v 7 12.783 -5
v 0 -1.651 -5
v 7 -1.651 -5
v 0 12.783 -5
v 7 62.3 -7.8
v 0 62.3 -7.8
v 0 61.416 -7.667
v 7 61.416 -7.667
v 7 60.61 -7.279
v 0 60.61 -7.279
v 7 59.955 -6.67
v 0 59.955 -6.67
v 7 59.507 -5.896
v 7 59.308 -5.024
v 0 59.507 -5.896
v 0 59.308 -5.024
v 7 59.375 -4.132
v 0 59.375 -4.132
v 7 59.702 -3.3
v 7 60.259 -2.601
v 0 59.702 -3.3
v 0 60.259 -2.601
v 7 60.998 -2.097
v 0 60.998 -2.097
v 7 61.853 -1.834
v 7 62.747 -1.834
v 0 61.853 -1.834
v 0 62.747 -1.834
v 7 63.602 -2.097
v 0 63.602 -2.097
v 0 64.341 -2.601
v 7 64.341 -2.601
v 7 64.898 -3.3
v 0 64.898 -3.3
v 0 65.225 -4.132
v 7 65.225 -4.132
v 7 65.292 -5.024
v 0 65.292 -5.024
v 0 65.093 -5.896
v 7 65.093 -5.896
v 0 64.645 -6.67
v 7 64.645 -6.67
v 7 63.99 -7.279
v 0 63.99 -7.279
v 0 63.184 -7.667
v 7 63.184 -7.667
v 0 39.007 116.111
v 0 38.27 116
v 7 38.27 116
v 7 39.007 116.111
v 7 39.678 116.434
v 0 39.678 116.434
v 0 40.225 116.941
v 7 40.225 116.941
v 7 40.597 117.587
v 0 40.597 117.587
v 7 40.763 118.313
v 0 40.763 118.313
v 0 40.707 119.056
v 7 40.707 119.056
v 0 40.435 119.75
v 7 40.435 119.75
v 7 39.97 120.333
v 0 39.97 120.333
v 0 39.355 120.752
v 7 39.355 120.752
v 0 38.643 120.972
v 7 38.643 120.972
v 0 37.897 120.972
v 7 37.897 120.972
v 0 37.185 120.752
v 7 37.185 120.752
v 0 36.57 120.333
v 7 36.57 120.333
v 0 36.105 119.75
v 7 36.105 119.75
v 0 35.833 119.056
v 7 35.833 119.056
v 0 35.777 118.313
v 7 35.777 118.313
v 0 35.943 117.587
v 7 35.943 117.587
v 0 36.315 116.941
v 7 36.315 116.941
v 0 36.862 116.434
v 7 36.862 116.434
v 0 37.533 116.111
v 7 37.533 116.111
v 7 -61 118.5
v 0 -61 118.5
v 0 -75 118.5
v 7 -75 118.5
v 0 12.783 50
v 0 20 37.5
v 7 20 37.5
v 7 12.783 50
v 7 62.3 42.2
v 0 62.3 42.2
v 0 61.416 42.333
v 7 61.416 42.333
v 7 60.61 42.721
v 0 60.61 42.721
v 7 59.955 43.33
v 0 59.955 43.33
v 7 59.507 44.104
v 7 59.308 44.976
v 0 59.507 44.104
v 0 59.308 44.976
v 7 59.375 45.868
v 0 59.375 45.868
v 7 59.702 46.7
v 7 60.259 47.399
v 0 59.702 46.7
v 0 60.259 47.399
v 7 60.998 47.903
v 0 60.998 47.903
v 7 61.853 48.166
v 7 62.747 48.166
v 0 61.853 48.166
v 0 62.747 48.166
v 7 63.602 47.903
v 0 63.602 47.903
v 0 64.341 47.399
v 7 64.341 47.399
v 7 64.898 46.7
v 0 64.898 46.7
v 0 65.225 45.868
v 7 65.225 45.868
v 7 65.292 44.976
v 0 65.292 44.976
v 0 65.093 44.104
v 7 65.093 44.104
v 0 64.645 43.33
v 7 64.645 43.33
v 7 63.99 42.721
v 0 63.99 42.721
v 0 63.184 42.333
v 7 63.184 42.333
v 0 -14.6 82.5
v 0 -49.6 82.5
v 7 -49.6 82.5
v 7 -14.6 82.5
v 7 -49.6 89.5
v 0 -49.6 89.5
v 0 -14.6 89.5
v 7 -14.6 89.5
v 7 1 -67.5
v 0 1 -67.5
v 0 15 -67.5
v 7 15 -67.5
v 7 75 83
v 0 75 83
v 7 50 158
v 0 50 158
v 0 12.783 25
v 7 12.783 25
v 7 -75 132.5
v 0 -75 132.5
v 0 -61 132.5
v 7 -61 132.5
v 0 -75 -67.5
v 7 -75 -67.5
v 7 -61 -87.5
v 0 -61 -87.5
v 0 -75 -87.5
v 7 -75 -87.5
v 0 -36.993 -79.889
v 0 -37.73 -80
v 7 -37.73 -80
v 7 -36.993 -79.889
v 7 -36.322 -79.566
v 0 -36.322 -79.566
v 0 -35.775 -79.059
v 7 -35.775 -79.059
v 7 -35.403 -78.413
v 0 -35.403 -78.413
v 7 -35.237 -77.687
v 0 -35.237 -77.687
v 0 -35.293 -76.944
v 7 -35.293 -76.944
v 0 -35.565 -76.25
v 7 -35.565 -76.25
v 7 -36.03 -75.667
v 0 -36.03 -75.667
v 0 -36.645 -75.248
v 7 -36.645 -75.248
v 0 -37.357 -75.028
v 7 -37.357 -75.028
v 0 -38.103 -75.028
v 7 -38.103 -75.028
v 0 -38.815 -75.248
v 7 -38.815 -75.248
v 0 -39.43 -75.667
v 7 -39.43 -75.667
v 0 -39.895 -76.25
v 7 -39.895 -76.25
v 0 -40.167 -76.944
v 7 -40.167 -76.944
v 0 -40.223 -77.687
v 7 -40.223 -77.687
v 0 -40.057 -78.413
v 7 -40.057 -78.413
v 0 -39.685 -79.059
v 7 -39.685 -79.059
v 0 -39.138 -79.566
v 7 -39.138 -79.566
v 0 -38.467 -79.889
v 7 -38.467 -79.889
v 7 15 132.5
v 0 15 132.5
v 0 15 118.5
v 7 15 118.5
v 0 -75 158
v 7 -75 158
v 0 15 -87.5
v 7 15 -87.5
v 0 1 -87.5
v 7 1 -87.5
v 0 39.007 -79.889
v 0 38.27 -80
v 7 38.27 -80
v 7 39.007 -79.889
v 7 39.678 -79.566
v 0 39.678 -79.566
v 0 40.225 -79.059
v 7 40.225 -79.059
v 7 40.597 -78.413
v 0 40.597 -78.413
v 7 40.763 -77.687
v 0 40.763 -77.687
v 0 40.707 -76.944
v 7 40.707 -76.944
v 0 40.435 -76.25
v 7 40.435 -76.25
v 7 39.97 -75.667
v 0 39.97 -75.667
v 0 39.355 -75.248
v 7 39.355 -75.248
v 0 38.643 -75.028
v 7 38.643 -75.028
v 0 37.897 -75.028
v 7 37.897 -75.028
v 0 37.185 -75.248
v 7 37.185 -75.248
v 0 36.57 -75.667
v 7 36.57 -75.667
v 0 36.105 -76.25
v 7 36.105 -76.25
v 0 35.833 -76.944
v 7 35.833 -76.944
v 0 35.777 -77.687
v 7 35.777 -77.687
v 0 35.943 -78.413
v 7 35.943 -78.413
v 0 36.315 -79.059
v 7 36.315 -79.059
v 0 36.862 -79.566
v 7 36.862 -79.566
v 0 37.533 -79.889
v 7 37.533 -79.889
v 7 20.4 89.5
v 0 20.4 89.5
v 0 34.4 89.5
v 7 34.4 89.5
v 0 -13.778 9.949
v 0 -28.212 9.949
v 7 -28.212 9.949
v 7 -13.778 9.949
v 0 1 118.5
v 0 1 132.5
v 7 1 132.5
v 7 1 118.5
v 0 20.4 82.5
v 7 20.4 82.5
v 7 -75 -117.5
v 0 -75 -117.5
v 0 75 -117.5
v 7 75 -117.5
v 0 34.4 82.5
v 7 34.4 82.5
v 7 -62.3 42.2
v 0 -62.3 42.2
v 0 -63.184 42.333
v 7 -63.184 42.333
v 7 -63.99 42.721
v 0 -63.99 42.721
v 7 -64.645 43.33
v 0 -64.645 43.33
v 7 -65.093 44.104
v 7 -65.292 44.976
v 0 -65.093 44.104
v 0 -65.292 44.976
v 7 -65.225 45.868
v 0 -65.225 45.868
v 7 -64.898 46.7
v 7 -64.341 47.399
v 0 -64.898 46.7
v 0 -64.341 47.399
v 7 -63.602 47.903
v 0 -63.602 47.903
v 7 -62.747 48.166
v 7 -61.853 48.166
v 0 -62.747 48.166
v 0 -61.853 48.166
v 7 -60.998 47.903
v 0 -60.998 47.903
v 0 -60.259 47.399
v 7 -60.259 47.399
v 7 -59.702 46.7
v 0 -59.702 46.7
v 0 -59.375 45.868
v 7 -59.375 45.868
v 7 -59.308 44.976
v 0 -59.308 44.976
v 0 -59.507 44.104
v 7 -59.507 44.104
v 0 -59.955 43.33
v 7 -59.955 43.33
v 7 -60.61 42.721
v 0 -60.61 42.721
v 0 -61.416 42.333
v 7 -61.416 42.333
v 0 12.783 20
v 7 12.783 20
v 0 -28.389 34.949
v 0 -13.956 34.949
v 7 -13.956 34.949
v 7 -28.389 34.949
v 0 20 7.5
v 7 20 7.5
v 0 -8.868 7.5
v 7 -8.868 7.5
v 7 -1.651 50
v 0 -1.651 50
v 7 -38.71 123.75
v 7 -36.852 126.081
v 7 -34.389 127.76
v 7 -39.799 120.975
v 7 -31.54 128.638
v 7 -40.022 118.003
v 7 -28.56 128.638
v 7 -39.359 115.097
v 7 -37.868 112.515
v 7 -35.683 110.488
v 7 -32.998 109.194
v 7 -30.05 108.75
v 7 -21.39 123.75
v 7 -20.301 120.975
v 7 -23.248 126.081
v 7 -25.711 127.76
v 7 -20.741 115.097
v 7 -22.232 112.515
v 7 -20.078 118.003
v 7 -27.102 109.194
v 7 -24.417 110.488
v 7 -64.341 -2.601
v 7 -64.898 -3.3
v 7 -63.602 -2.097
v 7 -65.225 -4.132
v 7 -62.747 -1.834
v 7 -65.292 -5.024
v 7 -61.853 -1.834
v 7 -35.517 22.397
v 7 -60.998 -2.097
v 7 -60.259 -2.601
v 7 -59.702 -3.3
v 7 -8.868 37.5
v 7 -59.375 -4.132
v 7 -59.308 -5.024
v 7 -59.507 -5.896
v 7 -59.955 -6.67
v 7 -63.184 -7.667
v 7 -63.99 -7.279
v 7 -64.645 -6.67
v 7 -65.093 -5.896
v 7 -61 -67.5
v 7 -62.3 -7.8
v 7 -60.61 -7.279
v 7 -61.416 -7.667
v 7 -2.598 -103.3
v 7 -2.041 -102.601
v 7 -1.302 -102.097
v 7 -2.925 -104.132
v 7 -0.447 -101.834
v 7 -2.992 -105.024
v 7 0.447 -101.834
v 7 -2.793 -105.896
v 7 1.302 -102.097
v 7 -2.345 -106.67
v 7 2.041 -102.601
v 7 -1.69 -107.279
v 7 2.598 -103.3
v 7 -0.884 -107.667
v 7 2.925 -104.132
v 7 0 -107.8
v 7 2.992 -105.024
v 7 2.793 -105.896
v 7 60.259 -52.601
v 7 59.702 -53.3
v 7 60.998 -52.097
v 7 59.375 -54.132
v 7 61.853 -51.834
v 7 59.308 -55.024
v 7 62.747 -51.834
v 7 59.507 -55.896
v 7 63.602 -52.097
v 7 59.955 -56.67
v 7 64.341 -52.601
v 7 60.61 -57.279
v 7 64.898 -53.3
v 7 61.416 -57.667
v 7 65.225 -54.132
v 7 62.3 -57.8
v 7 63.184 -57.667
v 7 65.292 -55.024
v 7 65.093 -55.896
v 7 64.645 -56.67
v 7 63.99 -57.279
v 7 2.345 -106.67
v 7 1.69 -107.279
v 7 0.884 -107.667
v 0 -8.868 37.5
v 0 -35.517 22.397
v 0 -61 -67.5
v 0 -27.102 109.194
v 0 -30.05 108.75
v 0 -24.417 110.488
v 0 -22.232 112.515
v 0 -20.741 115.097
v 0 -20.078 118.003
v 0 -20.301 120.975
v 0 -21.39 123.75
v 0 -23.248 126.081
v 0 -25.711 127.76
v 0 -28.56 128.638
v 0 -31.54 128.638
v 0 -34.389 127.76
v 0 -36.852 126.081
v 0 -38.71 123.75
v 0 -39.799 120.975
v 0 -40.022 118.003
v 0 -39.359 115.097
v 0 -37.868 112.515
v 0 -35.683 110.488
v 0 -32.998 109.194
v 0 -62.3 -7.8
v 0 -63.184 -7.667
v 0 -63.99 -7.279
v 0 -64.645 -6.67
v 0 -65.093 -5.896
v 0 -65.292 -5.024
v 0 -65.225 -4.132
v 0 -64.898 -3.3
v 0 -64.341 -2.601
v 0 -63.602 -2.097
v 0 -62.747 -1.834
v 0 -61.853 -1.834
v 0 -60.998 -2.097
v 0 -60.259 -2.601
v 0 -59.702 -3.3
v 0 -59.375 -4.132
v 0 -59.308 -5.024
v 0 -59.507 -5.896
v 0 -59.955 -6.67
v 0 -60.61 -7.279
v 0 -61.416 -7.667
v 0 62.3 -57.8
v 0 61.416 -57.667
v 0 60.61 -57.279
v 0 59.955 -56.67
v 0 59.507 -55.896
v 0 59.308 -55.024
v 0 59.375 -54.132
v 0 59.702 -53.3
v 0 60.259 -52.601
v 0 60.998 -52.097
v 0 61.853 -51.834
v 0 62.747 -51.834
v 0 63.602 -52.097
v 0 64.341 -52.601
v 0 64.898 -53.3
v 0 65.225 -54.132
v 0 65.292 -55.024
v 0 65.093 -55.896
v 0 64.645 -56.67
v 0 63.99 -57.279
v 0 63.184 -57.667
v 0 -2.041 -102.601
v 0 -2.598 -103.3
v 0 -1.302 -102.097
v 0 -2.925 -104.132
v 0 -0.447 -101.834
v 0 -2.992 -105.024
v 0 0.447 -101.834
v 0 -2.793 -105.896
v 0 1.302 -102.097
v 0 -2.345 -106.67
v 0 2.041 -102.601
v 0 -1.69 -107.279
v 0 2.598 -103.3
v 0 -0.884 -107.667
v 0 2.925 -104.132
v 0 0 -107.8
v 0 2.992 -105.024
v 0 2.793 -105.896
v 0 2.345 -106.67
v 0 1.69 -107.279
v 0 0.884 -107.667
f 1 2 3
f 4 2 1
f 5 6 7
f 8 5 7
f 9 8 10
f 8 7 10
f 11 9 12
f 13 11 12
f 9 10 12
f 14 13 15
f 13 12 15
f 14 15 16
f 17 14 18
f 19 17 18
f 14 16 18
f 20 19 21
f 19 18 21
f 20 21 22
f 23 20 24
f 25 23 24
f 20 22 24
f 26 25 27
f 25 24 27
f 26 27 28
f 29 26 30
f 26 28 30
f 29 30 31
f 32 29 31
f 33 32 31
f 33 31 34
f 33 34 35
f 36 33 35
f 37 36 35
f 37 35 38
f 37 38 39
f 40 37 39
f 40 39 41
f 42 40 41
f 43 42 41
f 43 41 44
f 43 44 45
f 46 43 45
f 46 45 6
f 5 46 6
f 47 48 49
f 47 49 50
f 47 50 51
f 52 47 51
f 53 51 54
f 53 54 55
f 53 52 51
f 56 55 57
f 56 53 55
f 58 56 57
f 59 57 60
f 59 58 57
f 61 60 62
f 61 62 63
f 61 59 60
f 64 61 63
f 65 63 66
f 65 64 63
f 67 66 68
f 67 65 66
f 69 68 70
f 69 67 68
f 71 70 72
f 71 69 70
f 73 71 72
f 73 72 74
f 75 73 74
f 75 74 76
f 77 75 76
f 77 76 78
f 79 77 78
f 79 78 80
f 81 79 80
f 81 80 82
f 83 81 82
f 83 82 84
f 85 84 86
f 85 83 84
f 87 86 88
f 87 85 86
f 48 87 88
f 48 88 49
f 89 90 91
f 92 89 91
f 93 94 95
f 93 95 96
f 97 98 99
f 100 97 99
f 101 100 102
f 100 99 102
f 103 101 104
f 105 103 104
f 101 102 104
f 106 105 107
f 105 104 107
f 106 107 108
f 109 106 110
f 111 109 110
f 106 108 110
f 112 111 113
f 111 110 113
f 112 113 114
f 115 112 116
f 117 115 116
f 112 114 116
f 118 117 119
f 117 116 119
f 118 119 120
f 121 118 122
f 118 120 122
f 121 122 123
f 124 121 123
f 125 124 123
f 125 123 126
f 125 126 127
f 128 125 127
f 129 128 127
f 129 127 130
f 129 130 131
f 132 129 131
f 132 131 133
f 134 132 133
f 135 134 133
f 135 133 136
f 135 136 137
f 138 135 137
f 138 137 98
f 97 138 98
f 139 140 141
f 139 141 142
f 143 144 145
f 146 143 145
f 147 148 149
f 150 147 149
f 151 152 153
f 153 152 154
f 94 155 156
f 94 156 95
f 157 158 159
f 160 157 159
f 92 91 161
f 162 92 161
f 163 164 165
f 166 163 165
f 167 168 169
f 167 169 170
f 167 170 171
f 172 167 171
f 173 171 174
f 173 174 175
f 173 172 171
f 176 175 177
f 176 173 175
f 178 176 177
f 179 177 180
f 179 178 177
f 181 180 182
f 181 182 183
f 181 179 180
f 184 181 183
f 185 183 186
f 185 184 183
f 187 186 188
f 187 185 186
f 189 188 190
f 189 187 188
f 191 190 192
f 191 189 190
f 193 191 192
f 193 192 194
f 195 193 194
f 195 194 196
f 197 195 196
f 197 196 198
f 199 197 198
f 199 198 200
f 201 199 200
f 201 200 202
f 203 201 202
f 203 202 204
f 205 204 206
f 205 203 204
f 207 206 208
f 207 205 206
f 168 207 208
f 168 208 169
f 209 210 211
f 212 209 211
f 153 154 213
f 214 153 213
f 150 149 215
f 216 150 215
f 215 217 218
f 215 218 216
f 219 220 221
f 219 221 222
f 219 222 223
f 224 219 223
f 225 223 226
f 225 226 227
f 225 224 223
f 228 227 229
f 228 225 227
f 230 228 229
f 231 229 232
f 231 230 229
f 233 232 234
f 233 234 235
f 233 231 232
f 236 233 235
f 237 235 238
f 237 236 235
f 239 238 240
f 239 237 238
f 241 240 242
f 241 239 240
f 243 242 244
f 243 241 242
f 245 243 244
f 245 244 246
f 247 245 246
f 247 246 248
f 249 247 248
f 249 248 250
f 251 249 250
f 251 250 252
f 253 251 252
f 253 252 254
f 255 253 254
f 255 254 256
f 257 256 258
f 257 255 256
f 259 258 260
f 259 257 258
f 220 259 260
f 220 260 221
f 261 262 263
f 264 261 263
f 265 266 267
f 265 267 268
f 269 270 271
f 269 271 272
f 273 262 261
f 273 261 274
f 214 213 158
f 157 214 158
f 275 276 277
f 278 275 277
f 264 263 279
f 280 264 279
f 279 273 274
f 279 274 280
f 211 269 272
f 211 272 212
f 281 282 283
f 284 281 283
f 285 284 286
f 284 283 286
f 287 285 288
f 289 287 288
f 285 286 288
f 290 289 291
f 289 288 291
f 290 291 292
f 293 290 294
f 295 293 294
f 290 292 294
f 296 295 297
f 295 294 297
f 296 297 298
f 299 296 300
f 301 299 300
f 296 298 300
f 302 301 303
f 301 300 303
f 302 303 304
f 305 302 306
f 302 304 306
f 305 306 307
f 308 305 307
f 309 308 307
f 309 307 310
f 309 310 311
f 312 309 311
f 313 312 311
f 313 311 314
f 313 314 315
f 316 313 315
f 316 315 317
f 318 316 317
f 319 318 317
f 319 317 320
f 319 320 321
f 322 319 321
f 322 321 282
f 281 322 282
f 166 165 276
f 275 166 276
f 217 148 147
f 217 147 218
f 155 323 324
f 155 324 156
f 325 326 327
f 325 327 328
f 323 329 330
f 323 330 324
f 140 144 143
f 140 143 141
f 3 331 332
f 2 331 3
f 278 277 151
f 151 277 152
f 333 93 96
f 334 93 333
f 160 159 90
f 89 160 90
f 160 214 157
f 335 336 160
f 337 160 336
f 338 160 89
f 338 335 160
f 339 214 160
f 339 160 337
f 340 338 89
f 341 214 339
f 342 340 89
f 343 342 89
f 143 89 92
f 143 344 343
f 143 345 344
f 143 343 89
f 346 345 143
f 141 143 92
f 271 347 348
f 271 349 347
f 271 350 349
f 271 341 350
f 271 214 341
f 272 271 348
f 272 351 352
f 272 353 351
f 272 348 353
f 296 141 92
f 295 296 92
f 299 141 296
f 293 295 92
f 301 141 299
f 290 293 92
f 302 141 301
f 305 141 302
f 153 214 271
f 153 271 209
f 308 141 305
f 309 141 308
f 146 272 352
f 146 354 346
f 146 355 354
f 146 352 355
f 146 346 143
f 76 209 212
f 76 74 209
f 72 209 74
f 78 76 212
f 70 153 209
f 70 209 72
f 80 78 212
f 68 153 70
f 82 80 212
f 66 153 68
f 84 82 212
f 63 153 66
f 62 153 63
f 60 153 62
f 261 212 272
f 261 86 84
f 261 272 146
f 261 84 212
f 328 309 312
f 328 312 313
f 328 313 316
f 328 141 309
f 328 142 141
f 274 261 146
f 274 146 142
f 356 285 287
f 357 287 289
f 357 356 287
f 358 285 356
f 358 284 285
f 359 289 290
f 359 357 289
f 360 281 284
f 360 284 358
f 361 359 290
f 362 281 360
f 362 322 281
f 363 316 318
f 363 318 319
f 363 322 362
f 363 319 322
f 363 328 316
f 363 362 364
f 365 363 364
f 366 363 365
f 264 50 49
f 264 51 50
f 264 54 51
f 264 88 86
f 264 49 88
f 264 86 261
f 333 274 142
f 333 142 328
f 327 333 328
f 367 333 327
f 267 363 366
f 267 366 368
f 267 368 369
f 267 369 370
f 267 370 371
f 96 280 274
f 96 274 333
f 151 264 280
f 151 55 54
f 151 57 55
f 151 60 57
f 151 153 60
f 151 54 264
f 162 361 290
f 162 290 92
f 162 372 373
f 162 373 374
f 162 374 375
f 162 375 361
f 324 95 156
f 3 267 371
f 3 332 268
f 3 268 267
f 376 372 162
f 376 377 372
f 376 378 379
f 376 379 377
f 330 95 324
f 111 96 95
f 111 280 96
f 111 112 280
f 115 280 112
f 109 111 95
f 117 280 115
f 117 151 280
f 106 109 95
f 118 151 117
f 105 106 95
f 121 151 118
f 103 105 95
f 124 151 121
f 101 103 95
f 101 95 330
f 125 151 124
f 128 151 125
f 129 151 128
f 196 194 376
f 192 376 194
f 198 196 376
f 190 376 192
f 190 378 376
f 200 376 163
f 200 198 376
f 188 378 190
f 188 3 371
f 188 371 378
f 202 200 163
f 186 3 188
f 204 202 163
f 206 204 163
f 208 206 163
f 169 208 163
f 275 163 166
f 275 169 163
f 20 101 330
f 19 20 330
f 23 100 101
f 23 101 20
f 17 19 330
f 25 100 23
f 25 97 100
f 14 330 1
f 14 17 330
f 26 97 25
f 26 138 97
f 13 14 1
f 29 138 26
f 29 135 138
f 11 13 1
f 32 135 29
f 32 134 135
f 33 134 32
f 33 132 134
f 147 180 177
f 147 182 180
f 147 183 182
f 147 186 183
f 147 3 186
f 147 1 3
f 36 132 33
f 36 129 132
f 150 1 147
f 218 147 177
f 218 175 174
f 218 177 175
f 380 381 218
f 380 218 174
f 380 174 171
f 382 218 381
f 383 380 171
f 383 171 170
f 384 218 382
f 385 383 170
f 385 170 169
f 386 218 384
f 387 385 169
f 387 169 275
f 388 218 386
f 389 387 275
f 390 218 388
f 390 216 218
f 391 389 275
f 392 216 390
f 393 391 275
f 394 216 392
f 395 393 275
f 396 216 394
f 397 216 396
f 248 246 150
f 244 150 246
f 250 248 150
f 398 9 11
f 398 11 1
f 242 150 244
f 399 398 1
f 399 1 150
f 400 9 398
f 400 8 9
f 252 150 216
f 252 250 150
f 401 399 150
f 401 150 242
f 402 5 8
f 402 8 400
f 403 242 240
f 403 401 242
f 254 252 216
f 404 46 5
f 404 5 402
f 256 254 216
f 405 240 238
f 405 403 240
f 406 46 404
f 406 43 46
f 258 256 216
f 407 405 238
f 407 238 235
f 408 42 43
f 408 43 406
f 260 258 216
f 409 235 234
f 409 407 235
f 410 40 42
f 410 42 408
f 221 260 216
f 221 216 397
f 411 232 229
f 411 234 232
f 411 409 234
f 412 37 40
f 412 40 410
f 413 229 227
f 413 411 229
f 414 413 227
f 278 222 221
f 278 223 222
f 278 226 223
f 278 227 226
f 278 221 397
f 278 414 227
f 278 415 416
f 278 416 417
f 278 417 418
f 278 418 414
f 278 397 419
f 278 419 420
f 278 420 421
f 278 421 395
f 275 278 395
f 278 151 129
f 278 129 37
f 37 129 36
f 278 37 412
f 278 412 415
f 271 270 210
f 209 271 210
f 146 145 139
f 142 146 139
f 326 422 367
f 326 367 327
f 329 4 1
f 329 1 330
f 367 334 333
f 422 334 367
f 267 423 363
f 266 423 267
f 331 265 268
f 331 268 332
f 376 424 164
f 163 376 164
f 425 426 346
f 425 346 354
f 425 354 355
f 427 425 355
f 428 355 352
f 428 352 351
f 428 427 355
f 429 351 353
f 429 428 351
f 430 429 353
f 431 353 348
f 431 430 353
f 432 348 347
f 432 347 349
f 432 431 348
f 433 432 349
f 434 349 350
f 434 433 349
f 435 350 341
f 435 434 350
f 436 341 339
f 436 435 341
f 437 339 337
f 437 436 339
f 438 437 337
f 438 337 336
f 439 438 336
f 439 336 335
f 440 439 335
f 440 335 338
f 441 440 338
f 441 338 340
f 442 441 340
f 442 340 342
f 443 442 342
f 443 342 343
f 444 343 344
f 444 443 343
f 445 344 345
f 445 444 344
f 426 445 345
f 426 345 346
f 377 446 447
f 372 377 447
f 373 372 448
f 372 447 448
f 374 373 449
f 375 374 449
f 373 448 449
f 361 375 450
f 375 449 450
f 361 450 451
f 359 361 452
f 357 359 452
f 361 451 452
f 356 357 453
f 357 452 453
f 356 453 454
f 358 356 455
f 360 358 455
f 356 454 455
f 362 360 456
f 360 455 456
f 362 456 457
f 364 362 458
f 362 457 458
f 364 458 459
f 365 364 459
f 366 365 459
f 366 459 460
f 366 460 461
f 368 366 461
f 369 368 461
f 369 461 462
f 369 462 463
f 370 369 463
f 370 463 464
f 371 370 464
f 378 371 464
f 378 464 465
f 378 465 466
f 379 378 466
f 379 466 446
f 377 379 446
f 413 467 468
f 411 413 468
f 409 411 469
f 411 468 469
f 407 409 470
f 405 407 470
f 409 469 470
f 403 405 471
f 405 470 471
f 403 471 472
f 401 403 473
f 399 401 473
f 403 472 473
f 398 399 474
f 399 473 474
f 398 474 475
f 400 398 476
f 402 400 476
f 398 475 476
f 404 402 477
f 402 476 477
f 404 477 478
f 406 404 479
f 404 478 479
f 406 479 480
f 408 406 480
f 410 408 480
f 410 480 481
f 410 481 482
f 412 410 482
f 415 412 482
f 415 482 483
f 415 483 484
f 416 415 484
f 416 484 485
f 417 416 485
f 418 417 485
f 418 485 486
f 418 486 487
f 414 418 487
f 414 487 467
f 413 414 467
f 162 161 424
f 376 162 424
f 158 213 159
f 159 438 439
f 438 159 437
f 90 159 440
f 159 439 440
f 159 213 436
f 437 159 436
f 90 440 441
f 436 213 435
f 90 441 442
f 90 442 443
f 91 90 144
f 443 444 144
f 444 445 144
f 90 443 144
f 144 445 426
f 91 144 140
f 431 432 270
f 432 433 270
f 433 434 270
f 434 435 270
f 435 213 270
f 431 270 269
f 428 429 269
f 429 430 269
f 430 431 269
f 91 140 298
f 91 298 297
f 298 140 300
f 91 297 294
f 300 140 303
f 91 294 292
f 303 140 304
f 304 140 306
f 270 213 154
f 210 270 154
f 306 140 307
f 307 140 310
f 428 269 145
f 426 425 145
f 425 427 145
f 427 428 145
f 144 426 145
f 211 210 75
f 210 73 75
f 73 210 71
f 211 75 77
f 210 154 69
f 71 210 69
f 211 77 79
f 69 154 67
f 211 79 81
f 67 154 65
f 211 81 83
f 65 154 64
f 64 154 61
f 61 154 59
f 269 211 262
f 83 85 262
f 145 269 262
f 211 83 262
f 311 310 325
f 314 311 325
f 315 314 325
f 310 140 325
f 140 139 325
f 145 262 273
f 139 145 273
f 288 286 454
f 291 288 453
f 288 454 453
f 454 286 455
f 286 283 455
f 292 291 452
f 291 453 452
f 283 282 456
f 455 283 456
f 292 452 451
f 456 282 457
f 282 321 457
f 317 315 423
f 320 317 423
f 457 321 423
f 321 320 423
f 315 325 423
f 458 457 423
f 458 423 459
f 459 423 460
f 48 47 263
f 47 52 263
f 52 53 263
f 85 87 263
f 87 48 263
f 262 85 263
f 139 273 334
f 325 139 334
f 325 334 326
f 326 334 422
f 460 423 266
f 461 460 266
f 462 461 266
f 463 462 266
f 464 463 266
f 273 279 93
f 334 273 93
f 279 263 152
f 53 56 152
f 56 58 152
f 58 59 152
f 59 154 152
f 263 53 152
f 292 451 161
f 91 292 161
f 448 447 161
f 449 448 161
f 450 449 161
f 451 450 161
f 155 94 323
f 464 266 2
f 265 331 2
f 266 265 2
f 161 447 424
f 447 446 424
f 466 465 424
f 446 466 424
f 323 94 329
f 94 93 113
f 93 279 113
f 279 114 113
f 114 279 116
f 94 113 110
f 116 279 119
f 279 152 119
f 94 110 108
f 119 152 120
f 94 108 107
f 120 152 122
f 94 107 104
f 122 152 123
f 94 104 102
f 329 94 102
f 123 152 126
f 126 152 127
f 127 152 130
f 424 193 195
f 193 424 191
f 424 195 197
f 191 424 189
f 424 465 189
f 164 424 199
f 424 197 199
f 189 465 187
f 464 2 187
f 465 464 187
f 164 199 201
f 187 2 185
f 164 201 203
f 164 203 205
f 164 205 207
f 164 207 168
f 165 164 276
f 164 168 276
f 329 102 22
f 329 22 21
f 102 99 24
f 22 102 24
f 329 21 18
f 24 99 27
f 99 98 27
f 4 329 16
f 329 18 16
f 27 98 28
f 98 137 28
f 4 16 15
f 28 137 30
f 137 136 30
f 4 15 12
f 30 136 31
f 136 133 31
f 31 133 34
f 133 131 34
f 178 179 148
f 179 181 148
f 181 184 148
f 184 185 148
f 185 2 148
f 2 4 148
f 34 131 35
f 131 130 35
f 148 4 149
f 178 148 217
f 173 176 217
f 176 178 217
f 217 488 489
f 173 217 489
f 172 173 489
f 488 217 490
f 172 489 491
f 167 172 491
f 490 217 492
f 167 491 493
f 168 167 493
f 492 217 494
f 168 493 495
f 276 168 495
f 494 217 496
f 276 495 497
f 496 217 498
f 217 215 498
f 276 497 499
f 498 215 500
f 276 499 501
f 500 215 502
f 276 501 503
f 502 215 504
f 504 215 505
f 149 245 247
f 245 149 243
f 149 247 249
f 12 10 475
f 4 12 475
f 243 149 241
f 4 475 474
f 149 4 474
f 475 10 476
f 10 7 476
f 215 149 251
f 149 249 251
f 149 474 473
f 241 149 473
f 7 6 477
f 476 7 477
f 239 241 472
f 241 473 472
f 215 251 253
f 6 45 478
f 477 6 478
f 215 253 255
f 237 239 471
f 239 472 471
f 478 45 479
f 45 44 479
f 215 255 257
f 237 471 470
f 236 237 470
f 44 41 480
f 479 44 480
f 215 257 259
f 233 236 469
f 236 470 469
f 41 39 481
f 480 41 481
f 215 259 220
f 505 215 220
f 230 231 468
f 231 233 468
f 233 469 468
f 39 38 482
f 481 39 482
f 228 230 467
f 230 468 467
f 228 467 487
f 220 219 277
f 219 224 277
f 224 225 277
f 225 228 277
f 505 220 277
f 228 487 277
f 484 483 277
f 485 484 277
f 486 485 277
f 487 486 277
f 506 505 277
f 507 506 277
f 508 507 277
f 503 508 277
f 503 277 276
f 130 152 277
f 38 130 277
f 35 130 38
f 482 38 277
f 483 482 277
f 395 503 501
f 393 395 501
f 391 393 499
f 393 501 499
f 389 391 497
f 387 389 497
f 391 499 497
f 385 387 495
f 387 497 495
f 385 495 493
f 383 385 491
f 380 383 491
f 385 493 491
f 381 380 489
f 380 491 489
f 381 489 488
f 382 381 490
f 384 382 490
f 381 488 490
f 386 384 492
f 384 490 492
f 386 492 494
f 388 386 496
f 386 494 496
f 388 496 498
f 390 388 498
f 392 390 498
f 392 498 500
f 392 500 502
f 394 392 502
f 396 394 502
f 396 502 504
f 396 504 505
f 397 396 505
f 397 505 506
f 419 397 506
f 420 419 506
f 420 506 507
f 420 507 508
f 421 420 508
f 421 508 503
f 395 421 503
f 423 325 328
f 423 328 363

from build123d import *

# Parameters (mm, degrees)
SKETCH1_R                = 10
SKETCH1_R_2              = 2.5
SKETCH1_W                = 14
SKETCH1_H                = 14
SKETCH1_W_2              = 20
SKETCH1_W_3              = 7
SKETCH1_H_2              = 35
BOSS_EXTRUDE1_DEPTH      = 7
F_6_0_6_DIAMETER_HOLE1_D = 6


with BuildPart() as part:
    # Sketch1 → Boss-Extrude1 (new body)
    with BuildSketch(Plane(origin=(0, 0, 0), x_dir=(0, 0, -1), z_dir=(1, 0, 0))):
        Polygon((-118.5, -75), (67.5, -75), (67.5, -61), (87.5, -61), (87.5, -75), (117.5, -75), (117.5, 75), (-83, 75), (-158, 50), (-158, -75), (-132.5, -75), (-132.5, -61), (-118.5, -61), align=None)
        with Locations((-118.75, -30.05)):
            Circle(SKETCH1_R, mode=Mode.SUBTRACT)
        with Locations((77.5, 38.27)):
            Circle(SKETCH1_R_2, mode=Mode.SUBTRACT)
        with Locations((-118.5, 38.27)):
            Circle(SKETCH1_R_2, mode=Mode.SUBTRACT)
        with Locations((77.5, -37.73)):
            Circle(SKETCH1_R_2, mode=Mode.SUBTRACT)
        with Locations((-125.5, 8)):
            Rectangle(SKETCH1_W, SKETCH1_H, mode=Mode.SUBTRACT)
        with Locations((77.5, 8)):
            Rectangle(SKETCH1_W_2, SKETCH1_H, mode=Mode.SUBTRACT)
        Polygon((-22.397299346, -35.516686773), (-9.948649676, -28.211588915), (-9.948649676, -13.777832185), (-7.5, -8.867513459), (5, -1.650635095), (5, 12.783121635), (-7.5, 20), (-20, 12.783121635), (-25, 12.783121635), (-37.5, 20), (-50, 12.783121635), (-50, -1.650635095), (-37.5, -8.867513459), (-34.94864967, -13.955732953), (-34.94864967, -28.389489683), align=None, mode=Mode.SUBTRACT)
        with Locations((-86, 27.4)):
            Rectangle(SKETCH1_W_3, SKETCH1_H, mode=Mode.SUBTRACT)
        with Locations((-86, -32.1)):
            Rectangle(SKETCH1_W_3, SKETCH1_H_2, mode=Mode.SUBTRACT)
    extrude(amount=BOSS_EXTRUDE1_DEPTH)

    # Ø6.0 (6) Diameter Hole1 (through all)
    with Locations(Plane(origin=(7, -62.3, -4.8), x_dir=(0, 0, 1), z_dir=(1, 0, 0))):
        with Locations((0, 0), (-100, -62.3), (-50, -124.6), (0, -124.6), (50, -124.6), (50, 0)):
            Hole(F_6_0_6_DIAMETER_HOLE1_D / 2)


solid = part.part
